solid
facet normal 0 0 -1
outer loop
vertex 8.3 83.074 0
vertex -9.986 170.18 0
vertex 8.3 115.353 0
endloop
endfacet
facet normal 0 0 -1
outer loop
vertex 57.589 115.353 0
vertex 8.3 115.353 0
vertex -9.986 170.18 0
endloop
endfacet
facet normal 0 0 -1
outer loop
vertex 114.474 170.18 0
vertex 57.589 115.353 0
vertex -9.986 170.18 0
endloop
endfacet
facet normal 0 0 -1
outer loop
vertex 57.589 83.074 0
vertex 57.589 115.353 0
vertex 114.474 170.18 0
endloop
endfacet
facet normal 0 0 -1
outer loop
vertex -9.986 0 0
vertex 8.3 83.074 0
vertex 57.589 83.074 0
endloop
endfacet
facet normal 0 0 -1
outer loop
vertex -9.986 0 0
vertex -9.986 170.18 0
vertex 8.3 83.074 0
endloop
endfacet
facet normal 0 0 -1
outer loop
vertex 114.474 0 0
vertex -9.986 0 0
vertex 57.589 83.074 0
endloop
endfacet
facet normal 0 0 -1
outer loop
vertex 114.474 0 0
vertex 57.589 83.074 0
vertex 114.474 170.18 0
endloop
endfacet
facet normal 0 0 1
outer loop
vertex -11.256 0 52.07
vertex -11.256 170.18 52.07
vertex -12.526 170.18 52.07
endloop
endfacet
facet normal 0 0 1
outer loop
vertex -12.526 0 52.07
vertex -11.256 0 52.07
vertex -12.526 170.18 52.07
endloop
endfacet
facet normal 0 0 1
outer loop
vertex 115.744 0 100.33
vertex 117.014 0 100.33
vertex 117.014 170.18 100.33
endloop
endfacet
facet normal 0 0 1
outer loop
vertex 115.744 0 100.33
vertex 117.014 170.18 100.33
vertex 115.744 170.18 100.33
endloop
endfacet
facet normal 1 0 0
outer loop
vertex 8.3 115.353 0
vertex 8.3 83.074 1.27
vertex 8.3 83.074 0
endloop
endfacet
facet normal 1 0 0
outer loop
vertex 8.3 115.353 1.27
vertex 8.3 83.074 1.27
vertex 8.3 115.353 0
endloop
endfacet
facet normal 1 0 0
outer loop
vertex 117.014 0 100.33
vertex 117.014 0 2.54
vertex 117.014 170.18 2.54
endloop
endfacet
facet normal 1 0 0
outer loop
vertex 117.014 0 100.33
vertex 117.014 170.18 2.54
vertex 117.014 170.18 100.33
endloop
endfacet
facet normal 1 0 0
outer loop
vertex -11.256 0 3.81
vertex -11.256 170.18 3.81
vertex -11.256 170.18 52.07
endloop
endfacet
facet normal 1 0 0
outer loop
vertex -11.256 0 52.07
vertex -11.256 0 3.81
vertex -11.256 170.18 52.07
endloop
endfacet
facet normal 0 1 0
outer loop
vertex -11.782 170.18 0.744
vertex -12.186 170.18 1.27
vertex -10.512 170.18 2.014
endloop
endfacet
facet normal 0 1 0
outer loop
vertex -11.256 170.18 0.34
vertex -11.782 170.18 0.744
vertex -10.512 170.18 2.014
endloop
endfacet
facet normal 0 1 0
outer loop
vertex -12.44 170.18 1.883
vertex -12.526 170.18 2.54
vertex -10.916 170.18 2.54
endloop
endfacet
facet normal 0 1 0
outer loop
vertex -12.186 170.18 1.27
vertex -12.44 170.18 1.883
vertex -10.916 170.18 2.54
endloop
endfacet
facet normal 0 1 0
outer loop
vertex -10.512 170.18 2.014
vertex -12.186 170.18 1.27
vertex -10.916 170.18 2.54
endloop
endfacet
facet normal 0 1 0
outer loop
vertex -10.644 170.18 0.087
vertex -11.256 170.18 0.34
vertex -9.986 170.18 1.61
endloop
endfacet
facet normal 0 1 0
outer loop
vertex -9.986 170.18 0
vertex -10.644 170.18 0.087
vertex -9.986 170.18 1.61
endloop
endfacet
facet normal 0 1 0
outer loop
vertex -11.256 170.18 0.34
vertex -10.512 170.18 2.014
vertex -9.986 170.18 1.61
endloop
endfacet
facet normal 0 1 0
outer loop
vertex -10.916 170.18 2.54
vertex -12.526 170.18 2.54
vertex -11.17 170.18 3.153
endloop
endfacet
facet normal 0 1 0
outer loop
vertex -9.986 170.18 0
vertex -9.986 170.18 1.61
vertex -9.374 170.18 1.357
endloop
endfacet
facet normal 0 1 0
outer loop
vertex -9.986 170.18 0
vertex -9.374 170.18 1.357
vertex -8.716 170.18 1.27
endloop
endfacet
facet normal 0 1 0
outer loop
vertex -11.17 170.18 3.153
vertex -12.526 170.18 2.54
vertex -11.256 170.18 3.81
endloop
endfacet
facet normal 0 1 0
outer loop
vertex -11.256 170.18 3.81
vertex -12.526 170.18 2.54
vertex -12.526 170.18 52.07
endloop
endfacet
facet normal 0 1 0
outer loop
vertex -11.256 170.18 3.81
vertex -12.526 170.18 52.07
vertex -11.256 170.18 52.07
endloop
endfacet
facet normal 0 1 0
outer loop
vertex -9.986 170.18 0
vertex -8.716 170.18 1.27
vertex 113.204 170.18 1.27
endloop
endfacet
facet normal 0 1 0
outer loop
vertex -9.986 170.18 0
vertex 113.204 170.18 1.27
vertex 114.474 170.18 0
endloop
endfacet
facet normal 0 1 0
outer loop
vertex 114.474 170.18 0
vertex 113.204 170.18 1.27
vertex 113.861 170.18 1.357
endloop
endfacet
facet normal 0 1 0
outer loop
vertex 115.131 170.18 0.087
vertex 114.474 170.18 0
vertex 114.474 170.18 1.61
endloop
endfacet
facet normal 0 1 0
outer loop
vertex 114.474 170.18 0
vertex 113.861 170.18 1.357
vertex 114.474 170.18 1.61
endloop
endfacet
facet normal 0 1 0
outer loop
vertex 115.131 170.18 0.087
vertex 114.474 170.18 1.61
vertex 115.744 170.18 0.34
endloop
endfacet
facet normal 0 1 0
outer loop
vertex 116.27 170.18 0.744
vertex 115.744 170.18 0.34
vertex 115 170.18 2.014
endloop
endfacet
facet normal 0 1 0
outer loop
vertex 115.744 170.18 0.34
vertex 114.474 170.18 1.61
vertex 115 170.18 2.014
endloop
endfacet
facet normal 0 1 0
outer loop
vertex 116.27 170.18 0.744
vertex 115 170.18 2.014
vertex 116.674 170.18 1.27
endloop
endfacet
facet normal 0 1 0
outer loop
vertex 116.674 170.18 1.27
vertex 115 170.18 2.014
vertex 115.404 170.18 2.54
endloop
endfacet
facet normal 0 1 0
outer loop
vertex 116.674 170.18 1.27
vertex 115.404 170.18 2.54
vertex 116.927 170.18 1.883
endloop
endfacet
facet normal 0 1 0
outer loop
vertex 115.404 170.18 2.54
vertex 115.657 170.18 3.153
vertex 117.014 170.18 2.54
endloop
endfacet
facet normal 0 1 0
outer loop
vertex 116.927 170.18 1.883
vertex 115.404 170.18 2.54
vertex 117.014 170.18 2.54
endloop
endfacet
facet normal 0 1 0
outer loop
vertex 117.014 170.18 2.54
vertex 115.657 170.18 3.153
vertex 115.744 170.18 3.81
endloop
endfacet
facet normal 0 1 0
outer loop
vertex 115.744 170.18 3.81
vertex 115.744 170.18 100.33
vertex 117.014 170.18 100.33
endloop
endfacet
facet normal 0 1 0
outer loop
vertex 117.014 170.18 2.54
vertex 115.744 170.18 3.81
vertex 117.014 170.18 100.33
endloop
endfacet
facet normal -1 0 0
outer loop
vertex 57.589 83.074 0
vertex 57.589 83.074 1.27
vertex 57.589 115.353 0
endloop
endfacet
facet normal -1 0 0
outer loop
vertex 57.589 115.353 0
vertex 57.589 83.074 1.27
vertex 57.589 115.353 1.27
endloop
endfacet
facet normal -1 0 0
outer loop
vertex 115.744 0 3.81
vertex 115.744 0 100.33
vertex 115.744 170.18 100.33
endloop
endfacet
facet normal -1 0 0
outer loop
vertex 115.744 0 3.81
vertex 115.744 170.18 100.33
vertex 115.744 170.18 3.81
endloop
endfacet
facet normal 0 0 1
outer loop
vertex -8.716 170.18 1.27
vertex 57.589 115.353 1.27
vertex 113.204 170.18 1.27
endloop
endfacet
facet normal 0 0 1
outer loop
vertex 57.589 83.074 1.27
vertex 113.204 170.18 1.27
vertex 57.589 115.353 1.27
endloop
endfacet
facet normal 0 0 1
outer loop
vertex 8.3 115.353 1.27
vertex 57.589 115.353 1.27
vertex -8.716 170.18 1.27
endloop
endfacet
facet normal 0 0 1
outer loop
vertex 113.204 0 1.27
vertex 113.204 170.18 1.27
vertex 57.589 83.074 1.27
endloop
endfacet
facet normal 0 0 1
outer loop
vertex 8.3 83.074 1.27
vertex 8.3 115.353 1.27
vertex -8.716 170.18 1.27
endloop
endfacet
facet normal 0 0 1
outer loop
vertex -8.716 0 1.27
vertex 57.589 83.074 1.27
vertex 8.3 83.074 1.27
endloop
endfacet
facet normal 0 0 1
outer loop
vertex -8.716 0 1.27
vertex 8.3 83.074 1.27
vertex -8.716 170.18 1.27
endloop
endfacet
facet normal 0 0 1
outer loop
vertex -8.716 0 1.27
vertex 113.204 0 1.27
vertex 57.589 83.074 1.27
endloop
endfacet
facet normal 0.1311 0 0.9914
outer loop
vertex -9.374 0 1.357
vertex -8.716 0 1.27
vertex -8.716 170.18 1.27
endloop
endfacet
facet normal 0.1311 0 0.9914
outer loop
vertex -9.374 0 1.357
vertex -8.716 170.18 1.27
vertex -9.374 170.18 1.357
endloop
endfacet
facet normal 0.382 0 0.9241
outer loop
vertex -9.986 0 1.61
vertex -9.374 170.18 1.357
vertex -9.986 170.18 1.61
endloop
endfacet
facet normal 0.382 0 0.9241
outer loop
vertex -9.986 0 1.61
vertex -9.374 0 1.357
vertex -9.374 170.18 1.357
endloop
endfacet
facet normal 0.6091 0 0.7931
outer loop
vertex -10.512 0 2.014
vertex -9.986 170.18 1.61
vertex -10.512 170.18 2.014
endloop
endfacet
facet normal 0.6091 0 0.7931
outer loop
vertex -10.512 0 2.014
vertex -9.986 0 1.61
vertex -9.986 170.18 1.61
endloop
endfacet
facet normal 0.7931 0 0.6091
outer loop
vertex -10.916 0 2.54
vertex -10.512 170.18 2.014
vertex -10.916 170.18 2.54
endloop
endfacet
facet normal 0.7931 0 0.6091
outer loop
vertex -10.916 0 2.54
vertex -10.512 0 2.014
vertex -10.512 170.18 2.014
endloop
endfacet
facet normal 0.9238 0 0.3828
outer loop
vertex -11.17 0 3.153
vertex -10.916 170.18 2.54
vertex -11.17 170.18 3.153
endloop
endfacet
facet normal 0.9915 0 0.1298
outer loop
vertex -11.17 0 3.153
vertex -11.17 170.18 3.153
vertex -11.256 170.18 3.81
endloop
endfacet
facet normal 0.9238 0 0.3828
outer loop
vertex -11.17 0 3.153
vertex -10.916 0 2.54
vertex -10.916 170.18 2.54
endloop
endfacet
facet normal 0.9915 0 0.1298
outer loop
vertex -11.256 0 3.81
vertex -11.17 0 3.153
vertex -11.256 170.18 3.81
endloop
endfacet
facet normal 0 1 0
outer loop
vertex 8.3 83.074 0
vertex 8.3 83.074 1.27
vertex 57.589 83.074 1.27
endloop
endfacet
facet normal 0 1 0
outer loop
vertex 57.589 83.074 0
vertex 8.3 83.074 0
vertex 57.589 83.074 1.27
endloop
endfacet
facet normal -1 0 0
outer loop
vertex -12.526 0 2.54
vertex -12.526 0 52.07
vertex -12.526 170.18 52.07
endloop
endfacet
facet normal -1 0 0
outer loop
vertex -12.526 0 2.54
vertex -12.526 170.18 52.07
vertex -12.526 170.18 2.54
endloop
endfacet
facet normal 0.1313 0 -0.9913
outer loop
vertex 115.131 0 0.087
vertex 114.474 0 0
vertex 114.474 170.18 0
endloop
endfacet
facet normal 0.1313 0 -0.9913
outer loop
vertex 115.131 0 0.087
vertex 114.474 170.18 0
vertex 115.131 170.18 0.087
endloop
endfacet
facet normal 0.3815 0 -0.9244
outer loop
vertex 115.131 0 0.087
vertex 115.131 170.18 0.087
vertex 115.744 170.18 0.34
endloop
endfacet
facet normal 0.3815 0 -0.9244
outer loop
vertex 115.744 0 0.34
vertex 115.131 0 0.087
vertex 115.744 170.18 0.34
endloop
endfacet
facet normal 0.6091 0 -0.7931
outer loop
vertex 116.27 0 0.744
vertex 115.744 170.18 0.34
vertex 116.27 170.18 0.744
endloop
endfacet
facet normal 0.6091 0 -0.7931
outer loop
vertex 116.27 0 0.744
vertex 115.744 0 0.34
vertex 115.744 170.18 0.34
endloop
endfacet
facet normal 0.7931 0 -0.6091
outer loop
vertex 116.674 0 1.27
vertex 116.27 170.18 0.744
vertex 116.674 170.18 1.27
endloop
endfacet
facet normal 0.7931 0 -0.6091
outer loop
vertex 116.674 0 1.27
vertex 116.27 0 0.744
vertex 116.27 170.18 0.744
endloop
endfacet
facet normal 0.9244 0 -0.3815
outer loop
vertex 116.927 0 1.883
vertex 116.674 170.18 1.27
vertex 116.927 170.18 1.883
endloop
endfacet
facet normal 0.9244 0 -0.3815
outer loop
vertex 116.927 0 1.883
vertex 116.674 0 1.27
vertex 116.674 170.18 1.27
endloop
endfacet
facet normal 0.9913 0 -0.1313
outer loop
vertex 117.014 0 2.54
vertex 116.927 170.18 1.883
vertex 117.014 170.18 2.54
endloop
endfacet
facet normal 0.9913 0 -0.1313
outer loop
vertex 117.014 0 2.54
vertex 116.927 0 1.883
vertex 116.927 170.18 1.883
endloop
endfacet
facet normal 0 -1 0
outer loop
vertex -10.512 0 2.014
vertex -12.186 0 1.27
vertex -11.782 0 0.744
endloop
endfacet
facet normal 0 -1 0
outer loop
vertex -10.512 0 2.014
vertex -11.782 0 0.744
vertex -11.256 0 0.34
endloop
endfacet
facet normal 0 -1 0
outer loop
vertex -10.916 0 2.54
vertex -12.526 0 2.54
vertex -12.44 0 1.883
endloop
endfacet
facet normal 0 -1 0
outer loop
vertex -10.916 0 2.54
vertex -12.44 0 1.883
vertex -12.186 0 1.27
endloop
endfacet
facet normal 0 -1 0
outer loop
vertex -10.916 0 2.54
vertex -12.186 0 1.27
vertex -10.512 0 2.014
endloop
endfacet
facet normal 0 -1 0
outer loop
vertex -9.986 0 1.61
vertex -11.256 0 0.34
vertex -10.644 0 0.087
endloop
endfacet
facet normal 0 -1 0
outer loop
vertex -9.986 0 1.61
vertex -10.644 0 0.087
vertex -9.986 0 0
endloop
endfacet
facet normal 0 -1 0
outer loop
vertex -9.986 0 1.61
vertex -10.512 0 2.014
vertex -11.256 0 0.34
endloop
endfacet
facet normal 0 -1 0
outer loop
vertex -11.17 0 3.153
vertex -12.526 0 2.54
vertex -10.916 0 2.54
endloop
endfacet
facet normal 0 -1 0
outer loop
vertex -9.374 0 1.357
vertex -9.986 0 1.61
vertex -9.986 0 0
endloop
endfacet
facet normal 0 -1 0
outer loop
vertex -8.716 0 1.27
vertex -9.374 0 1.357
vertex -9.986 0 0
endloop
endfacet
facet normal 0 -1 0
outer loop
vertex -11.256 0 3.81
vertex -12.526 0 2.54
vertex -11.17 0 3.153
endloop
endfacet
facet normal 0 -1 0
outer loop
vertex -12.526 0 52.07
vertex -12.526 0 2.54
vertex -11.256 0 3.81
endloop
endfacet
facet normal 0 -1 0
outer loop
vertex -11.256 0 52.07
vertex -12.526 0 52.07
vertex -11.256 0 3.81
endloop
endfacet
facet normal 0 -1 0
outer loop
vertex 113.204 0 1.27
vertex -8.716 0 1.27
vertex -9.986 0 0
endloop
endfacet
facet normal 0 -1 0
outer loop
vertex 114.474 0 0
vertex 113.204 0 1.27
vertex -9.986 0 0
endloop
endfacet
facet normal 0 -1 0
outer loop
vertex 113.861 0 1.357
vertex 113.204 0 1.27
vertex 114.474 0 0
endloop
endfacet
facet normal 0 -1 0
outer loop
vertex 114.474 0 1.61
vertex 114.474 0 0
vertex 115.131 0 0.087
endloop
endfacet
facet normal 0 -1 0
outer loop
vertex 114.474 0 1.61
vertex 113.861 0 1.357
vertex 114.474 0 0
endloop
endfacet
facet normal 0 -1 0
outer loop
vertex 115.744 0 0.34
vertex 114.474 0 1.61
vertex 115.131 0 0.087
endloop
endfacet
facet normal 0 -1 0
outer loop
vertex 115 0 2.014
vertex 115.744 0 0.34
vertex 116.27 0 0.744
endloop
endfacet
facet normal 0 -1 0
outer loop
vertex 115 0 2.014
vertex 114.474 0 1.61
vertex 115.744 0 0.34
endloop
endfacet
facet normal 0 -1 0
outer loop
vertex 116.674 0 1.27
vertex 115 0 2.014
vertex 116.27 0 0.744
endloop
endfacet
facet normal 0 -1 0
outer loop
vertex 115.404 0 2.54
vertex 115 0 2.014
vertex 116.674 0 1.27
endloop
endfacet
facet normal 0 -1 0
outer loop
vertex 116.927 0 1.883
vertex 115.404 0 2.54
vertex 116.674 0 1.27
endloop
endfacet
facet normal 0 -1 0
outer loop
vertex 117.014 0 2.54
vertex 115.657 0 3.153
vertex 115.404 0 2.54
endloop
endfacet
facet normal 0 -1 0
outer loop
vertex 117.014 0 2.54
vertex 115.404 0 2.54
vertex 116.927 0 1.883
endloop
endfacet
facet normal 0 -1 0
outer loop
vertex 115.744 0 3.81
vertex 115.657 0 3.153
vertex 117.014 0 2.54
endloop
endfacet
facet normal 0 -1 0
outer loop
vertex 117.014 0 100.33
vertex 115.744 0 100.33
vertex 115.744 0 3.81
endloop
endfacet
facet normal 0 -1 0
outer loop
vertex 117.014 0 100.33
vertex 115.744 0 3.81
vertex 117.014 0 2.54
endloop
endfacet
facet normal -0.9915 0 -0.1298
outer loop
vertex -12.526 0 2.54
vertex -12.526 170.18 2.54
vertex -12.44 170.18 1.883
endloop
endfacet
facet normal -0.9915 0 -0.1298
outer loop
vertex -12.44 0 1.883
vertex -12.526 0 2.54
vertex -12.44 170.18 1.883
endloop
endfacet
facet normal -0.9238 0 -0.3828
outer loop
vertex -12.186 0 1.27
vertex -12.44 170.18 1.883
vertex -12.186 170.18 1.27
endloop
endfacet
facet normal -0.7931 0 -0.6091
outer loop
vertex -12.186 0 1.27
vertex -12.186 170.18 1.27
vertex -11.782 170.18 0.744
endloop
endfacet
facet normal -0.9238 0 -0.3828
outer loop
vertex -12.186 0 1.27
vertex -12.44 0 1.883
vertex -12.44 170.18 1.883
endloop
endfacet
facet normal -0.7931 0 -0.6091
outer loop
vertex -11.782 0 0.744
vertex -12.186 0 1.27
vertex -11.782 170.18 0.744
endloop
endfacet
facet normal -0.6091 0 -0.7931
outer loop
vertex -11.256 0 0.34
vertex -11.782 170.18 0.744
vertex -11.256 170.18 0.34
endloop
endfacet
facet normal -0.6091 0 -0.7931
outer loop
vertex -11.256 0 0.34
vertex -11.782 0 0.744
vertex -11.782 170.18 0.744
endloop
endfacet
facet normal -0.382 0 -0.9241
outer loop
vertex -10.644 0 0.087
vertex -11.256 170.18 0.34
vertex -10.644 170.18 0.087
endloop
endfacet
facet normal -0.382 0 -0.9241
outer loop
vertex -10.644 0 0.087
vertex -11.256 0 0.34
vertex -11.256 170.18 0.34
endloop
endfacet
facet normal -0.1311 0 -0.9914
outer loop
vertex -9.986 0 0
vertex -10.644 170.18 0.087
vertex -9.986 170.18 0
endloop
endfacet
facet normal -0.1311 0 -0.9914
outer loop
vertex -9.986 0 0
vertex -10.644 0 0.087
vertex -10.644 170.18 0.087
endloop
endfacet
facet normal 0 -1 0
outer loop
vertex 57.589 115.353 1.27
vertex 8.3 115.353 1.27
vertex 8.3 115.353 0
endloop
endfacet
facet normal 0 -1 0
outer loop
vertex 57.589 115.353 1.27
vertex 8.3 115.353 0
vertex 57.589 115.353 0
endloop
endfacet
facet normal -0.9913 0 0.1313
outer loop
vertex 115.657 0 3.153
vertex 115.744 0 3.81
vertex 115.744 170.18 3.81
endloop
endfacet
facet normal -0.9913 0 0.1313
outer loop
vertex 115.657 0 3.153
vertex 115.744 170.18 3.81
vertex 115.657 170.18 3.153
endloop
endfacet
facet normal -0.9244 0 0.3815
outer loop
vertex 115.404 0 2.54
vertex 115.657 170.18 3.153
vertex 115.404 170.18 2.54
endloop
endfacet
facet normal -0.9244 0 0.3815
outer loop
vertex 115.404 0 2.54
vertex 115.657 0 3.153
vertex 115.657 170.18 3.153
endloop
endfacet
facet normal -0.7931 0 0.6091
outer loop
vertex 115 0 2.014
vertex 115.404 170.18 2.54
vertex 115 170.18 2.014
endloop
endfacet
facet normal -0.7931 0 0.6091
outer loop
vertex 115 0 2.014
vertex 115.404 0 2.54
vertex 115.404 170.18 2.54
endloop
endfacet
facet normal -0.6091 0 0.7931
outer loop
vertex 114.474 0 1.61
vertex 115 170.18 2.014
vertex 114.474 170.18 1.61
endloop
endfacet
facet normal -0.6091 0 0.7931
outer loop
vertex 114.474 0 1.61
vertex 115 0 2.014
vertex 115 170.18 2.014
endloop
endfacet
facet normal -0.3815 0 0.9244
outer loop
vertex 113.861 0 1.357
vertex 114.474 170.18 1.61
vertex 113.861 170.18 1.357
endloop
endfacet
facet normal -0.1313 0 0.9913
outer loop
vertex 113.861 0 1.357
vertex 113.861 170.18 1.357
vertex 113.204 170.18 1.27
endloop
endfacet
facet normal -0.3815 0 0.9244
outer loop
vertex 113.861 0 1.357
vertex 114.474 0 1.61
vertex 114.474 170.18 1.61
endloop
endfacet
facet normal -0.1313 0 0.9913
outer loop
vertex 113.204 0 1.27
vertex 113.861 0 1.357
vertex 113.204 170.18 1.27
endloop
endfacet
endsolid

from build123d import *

# Parameters (mm, degrees)
F1_DEPTH = 170.18
F2_W     = 49.288719
F2_H     = 32.279059
F3_DEPTH = 25.4


with BuildPart() as f1:
    # F0 (on Front) → F1 (new body)
    with BuildSketch(Plane.XZ):
        with BuildLine():
            Line((-9.986188, 0), (0, 0))
            Line((0, 0), (114.473812, 0))
            ThreePointArc((114.473812, 0), (116.269863, 0.743949), (117.013812, 2.54))
            Line((117.013812, 2.54), (117.013812, 100.33))
            Line((117.013812, 100.33), (115.743812, 100.33))
            Line((115.743812, 100.33), (115.743812, 3.81))
            ThreePointArc((115.743812, 3.81), (114.999863, 2.013949), (113.203812, 1.27))
            Line((113.203812, 1.27), (-8.716188, 1.27))
            ThreePointArc((-8.716188, 1.27), (-10.512239, 2.013949), (-11.256188, 3.81))
            Line((-11.256188, 3.81), (-11.256188, 52.07))
            Line((-11.256188, 52.07), (-12.526188, 52.07))
            Line((-12.526188, 52.07), (-12.526188, 2.54))
            ThreePointArc((-12.526188, 2.54), (-11.782239, 0.743949), (-9.986188, 0))
        make_face()
    extrude(amount=-F1_DEPTH)

    # F2 (on face) → F3 (cut)
    with BuildSketch(Plane.XY.offset(1.27)):
        with Locations((32.944252, 99.213123)):
            Rectangle(F2_W, F2_H)
    extrude(amount=-F3_DEPTH, mode=Mode.SUBTRACT)


solid = f1.part
